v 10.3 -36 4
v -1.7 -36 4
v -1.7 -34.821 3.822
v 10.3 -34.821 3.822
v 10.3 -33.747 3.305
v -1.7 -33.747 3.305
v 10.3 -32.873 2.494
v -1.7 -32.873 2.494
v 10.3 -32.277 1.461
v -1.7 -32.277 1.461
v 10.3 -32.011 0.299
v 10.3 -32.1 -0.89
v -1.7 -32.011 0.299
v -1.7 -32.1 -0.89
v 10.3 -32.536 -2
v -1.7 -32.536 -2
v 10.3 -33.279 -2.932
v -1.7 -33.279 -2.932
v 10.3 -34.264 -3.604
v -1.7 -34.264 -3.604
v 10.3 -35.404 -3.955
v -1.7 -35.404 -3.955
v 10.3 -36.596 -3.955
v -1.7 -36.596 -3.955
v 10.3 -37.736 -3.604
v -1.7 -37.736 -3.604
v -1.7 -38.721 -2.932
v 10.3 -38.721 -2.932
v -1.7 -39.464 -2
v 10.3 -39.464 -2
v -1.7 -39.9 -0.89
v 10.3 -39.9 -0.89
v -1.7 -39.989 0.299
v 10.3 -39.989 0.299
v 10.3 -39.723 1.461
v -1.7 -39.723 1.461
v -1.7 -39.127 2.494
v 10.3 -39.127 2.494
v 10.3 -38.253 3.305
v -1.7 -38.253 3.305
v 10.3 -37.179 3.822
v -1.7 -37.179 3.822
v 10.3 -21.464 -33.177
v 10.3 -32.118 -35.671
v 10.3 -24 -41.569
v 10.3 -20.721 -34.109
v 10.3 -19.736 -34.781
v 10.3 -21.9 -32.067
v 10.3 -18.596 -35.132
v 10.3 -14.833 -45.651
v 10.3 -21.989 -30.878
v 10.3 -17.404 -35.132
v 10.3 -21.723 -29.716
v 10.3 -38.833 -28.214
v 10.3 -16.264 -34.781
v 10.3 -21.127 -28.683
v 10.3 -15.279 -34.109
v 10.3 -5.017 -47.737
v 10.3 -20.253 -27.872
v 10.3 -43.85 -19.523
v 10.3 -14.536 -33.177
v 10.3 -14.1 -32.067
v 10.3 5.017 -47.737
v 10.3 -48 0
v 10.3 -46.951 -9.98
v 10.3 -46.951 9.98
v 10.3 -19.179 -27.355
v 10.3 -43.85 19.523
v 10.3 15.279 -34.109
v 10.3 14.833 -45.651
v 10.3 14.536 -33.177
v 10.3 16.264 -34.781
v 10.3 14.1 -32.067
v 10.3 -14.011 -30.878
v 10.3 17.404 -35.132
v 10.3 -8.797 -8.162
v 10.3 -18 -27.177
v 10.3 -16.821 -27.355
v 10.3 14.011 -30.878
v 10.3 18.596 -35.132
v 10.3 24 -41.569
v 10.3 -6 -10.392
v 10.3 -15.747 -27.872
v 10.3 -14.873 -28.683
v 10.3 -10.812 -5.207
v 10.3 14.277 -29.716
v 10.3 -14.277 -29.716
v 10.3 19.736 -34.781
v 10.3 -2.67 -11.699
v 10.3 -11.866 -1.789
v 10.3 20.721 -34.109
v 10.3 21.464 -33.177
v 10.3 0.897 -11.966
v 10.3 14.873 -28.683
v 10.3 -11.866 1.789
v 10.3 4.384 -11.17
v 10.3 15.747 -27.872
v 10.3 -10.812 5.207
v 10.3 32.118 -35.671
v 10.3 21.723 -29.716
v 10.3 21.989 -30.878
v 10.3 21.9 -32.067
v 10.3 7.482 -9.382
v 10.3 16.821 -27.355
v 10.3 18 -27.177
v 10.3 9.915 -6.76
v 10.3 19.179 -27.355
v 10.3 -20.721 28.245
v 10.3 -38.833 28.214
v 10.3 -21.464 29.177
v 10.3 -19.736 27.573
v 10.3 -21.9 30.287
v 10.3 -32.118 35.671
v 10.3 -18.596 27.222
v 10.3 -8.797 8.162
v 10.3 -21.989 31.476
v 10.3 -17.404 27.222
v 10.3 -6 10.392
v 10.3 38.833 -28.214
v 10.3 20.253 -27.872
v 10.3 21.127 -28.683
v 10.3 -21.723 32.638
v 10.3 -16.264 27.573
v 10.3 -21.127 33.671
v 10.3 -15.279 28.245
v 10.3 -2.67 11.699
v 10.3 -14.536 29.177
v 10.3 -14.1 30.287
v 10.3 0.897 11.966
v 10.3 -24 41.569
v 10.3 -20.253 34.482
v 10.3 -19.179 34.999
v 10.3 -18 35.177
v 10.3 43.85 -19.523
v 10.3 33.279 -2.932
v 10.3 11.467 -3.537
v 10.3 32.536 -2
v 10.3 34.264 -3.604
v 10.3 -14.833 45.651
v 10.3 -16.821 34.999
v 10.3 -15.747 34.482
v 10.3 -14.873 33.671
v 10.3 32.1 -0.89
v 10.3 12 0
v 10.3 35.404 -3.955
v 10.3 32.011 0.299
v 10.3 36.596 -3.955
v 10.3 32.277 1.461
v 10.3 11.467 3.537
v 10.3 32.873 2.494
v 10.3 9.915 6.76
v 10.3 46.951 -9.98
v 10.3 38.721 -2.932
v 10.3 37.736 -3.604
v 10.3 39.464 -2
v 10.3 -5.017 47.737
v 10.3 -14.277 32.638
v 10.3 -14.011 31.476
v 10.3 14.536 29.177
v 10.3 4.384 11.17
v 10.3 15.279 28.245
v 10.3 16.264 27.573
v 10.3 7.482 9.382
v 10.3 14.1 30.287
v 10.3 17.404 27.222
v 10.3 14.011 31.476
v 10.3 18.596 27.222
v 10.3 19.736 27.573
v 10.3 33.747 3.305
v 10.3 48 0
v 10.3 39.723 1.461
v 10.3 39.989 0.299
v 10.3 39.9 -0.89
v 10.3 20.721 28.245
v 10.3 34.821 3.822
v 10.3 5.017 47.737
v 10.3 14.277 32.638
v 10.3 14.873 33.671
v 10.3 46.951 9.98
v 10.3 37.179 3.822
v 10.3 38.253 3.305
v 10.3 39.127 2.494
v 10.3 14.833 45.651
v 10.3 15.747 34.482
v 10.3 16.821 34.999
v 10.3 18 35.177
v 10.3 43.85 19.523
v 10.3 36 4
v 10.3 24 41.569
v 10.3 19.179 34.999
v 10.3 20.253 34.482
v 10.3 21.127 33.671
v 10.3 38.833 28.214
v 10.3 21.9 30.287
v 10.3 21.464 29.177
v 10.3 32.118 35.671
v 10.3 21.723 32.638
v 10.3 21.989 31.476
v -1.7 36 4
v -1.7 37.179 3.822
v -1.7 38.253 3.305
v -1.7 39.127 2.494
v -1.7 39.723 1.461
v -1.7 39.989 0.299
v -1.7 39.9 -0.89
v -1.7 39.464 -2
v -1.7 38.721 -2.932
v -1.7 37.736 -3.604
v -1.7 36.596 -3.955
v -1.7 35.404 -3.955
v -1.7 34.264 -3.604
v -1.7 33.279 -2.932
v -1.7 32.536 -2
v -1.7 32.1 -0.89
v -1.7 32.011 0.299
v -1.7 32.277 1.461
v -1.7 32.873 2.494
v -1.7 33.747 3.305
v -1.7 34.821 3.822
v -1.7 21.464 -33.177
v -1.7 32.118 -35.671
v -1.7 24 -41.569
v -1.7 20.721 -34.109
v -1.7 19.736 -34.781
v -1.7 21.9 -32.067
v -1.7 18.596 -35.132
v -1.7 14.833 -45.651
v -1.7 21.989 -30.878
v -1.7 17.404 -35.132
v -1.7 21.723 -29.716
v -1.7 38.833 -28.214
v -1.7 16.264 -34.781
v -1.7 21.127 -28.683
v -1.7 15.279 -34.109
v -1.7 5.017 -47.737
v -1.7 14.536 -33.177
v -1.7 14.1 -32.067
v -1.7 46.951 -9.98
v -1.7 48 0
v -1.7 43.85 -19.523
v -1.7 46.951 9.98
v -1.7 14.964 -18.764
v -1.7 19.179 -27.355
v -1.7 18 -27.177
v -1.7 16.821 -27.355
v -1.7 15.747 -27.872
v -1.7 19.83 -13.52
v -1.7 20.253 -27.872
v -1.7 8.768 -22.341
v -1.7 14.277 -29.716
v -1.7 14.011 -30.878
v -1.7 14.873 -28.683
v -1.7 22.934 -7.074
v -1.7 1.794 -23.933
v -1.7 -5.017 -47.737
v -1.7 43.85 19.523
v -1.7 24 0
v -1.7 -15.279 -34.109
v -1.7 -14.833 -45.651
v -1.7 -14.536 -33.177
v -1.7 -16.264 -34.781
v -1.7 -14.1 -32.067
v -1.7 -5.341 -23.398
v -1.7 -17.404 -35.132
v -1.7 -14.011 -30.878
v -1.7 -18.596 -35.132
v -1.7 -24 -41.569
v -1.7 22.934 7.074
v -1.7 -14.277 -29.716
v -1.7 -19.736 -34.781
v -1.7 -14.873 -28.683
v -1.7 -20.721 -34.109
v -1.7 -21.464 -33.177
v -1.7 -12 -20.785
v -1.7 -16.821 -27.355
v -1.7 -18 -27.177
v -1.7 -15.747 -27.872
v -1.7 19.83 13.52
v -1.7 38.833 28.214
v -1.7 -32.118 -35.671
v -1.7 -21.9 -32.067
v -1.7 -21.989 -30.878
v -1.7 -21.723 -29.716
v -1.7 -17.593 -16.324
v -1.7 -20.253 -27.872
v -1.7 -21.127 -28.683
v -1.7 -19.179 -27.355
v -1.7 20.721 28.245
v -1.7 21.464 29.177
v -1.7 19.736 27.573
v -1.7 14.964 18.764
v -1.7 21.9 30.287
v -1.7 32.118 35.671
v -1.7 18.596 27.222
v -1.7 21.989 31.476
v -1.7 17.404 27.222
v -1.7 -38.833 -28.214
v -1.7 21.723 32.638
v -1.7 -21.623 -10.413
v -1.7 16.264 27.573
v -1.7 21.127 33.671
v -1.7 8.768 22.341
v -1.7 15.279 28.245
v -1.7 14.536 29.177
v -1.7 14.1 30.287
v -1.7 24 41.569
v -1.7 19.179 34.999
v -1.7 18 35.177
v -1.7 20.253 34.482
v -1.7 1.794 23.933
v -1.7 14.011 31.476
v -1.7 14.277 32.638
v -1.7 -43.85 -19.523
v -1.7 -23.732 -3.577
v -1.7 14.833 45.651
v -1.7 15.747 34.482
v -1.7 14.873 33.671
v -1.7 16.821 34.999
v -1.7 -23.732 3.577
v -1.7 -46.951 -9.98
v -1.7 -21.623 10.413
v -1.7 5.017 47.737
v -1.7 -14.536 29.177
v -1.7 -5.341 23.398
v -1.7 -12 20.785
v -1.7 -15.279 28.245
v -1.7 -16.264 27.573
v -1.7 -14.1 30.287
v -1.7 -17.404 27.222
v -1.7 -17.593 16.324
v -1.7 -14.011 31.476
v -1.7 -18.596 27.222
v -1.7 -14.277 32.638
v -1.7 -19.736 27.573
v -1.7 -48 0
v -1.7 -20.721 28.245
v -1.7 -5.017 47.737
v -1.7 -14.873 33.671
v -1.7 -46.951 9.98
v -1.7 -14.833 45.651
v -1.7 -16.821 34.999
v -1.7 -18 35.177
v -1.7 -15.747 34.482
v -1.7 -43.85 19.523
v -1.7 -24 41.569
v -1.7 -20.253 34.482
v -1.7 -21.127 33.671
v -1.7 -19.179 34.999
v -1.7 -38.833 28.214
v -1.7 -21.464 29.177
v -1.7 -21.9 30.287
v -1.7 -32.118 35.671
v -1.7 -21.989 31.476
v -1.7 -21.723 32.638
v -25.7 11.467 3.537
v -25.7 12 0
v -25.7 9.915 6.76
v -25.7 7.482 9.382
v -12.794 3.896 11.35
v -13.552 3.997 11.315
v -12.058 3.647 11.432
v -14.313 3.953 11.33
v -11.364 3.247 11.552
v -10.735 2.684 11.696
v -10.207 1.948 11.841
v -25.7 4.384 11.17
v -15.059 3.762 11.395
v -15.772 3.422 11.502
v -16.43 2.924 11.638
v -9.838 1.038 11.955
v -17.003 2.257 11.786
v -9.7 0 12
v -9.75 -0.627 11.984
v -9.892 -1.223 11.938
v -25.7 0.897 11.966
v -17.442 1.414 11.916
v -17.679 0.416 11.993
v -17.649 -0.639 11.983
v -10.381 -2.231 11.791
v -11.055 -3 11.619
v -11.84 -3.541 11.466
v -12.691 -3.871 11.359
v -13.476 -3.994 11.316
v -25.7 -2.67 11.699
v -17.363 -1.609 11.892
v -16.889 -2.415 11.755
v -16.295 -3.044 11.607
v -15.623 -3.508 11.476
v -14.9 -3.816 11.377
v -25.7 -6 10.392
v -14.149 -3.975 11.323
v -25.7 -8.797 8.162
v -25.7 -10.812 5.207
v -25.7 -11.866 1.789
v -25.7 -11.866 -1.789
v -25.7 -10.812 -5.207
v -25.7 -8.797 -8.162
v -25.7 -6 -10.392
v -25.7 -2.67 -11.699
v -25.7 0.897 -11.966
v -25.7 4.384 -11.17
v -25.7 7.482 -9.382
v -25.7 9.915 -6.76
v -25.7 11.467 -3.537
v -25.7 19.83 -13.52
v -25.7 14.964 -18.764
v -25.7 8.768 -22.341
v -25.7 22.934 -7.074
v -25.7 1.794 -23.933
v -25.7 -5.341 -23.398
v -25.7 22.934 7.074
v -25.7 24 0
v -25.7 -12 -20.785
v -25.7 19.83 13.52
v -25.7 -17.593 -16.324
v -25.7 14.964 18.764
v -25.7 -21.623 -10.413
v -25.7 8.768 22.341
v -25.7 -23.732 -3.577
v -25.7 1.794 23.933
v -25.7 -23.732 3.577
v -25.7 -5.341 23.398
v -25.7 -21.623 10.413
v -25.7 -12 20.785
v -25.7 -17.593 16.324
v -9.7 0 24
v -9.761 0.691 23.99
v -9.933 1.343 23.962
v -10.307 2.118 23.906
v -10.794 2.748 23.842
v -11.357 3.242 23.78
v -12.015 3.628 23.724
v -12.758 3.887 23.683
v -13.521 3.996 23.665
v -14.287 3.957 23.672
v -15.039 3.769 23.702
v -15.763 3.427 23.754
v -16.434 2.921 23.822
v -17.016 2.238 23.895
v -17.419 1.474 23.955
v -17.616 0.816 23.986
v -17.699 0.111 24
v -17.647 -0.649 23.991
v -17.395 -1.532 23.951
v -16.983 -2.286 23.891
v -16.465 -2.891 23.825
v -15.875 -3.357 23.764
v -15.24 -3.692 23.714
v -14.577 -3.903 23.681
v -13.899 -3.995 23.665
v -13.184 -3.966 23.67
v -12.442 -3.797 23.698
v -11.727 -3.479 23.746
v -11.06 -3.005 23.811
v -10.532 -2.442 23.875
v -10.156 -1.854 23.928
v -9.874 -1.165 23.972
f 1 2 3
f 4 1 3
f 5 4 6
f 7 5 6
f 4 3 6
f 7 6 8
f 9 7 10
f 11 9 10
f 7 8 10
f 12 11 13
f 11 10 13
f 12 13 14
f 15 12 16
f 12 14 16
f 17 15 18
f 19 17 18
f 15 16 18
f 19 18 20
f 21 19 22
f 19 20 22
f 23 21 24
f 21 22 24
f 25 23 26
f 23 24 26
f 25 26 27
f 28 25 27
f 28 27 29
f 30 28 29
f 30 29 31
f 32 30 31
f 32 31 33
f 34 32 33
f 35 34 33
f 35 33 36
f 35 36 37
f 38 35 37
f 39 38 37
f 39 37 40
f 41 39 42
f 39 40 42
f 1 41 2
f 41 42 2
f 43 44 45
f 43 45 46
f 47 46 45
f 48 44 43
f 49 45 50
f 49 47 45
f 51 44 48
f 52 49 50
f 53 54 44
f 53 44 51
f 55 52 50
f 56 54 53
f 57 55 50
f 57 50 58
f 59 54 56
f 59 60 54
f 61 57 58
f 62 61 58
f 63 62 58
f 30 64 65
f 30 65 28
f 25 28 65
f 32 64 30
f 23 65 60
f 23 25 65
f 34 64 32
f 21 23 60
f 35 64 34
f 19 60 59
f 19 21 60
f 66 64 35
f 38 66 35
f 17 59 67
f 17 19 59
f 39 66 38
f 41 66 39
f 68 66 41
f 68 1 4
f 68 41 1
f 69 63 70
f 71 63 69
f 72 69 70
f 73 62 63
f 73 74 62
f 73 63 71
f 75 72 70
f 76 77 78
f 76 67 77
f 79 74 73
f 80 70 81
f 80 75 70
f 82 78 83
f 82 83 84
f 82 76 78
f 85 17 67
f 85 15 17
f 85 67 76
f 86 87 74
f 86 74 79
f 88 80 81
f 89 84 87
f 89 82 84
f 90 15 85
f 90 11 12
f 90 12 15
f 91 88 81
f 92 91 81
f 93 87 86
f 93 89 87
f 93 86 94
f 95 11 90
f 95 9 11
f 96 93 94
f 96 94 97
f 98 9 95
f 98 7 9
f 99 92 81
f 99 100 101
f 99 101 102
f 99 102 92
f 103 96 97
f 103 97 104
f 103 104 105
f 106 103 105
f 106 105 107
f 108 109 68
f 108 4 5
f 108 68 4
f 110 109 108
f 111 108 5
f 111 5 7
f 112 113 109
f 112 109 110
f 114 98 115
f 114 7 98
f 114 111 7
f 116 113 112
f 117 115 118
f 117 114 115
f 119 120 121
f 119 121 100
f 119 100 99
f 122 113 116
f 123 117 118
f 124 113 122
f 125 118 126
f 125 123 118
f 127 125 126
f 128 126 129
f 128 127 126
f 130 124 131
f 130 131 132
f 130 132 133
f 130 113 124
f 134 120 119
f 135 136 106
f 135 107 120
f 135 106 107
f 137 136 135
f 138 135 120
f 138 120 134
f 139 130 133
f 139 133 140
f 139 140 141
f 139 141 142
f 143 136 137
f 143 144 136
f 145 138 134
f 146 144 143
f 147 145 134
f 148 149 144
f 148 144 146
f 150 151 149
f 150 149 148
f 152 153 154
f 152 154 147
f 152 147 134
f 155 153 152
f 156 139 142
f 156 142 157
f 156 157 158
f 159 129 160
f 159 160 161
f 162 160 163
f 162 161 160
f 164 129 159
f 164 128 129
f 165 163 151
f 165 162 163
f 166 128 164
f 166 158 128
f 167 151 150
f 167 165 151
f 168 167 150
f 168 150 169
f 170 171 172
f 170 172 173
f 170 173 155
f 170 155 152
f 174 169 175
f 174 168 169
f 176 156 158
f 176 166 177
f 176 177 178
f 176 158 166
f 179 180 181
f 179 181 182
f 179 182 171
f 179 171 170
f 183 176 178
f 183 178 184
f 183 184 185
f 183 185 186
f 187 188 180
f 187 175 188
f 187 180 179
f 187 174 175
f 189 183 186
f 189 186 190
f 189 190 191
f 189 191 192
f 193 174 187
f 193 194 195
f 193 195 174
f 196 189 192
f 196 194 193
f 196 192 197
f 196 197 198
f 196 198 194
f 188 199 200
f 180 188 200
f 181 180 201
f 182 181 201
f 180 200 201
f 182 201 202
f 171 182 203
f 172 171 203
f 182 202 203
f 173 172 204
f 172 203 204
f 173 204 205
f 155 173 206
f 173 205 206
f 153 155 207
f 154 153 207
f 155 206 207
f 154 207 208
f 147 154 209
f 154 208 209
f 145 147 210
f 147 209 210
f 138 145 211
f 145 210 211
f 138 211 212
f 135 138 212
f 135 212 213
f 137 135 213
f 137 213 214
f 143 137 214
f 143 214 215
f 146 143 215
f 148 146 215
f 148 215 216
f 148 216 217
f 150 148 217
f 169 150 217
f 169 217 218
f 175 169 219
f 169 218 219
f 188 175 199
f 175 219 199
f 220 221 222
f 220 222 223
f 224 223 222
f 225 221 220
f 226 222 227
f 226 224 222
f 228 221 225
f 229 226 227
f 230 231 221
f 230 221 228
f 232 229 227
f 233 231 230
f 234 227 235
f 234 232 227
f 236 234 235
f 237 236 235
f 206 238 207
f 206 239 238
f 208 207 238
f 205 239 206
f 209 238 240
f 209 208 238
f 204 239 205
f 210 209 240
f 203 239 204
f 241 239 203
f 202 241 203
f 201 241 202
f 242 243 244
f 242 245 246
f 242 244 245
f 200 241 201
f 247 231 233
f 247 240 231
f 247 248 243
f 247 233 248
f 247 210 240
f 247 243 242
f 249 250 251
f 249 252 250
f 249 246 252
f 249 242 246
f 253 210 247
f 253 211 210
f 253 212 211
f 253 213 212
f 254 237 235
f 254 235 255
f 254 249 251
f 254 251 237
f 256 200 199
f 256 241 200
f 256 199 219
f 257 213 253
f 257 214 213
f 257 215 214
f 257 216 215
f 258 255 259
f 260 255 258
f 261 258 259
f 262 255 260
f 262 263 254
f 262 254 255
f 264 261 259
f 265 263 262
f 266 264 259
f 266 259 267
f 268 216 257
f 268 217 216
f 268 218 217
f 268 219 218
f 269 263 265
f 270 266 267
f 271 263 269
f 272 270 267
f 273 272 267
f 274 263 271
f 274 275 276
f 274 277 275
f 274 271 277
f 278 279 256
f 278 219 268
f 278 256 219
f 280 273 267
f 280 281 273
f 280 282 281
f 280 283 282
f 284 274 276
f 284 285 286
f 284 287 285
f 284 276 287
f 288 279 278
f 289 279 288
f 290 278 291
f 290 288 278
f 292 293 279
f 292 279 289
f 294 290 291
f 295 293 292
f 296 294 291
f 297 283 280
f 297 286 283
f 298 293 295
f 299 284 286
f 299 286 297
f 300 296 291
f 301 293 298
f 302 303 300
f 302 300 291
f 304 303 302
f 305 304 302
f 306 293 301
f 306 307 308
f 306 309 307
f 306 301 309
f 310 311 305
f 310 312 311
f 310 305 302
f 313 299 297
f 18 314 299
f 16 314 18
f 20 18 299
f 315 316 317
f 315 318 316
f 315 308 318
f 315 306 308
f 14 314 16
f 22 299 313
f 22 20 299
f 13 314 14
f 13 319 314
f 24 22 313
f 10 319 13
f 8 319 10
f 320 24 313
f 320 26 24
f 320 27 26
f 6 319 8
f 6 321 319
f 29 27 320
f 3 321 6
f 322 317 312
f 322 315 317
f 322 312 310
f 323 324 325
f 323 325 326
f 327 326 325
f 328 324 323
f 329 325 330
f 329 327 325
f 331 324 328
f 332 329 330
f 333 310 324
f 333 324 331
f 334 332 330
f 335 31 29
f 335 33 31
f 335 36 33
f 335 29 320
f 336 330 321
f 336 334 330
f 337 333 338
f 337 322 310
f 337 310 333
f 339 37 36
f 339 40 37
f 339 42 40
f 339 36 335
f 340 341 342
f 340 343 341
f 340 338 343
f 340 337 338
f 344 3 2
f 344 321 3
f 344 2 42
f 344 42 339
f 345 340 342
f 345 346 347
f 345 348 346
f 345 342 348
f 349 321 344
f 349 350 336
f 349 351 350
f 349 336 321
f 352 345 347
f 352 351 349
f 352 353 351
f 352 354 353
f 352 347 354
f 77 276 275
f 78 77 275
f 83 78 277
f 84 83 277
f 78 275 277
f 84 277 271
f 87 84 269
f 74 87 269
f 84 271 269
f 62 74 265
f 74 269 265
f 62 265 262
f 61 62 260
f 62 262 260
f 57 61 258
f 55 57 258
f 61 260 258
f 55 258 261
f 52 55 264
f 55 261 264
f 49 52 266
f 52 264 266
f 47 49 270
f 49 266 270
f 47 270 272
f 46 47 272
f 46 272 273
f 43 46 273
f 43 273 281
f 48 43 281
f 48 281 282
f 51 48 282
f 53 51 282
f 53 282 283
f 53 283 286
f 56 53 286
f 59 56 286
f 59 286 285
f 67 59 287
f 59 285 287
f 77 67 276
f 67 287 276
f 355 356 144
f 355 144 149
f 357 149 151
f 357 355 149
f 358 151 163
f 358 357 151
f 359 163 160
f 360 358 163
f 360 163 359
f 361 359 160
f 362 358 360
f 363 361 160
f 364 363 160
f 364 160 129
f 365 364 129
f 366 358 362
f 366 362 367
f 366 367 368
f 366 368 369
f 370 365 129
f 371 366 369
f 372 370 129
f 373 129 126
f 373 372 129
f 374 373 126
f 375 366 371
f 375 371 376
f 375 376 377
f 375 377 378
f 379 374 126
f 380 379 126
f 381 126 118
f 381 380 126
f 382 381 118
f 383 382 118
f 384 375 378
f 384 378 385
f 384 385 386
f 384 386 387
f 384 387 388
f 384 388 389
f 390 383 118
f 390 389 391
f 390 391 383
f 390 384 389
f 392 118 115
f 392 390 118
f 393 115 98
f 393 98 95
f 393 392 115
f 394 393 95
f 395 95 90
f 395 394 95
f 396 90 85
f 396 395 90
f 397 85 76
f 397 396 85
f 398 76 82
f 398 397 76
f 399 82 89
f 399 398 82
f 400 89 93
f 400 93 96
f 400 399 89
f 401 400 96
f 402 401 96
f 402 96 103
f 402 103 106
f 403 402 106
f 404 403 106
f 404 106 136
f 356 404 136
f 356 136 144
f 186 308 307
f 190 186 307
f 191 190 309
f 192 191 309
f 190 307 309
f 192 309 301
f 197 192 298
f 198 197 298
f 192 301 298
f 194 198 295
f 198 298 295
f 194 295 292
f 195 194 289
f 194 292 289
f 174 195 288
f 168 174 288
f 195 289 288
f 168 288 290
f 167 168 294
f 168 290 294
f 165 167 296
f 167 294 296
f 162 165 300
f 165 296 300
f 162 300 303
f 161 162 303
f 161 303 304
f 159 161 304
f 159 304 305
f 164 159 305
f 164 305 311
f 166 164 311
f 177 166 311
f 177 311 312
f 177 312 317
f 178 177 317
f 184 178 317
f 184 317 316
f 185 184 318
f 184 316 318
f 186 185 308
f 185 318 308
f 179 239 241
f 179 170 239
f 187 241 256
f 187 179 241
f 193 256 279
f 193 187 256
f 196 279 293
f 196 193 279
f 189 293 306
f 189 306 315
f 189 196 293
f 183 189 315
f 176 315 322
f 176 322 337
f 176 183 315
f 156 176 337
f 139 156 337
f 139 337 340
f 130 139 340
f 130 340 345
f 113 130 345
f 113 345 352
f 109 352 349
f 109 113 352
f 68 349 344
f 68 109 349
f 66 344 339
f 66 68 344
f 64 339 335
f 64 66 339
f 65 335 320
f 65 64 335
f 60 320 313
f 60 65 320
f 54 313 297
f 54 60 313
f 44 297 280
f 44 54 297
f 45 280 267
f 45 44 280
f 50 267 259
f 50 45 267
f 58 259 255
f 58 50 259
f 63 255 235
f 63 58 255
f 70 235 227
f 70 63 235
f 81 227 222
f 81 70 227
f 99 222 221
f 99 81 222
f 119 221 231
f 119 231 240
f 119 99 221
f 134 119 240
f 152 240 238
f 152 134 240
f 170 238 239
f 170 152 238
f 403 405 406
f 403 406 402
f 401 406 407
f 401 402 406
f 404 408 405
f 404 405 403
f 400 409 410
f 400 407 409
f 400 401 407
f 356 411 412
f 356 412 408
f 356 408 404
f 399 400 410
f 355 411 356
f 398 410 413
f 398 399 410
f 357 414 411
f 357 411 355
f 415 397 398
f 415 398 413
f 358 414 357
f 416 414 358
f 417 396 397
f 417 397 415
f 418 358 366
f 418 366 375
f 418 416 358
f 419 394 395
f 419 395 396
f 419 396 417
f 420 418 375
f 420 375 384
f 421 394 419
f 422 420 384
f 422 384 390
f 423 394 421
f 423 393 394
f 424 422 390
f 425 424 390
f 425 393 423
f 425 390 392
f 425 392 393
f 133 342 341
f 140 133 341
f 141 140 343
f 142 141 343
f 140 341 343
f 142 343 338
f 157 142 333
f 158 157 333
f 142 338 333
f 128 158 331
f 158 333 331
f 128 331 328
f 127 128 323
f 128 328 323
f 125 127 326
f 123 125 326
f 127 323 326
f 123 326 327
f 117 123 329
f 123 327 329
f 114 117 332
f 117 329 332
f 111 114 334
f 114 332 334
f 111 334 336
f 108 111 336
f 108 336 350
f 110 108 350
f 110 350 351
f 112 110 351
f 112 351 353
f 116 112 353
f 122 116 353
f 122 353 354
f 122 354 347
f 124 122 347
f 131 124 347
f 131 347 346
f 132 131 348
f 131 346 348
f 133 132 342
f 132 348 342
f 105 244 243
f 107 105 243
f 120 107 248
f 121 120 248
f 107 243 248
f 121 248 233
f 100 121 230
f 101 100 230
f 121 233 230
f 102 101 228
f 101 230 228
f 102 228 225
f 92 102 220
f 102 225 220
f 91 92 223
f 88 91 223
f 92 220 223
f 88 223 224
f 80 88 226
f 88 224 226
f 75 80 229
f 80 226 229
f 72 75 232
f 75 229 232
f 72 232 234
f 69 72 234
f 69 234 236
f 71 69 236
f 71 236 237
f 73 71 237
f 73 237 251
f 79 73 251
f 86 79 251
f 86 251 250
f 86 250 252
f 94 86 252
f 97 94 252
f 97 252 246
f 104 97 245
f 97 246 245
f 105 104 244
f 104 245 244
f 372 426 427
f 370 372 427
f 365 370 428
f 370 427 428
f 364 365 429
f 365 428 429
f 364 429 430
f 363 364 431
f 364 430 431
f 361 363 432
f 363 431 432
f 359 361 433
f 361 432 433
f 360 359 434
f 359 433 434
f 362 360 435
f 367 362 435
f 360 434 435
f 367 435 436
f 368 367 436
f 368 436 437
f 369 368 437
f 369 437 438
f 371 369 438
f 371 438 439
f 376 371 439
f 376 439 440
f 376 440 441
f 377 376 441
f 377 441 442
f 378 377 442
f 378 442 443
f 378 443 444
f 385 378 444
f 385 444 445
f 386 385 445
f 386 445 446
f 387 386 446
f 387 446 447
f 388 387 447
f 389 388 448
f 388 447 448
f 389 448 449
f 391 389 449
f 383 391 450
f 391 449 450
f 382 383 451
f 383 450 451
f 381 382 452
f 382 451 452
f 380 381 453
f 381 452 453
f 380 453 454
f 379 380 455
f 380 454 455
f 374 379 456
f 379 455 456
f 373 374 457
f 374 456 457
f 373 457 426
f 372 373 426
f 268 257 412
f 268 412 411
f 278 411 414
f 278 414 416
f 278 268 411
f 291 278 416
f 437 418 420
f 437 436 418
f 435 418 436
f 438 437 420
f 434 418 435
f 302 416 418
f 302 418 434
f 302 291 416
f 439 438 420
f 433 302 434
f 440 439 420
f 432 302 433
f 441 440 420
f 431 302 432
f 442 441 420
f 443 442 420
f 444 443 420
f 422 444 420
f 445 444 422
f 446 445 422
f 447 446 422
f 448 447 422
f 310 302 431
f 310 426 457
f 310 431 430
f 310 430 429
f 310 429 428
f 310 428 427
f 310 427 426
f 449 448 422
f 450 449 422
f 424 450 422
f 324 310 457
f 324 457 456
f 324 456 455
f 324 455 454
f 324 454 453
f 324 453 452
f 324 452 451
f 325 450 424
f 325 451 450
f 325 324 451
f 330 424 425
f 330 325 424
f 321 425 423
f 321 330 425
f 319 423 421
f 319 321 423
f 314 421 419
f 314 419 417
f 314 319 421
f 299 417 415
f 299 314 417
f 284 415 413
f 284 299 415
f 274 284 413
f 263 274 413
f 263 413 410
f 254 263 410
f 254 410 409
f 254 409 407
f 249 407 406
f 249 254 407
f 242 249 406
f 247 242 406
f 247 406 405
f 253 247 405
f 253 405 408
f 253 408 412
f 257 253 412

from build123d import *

# Parameters (mm, degrees)
SKETCH2_R          = 4
CUT_EXTRUDE1_DEPTH = 12
CUT_EXTRUDE2_REACH = 74
SKETCH3_R          = 4


with BuildPart() as part:
    # Sketch1 → Revolve1 (revolve)
    with BuildSketch(Plane.XY):
        Polygon((-25.700460829, 12), (-25.700460829, 24), (-1.700460829, 24), (-1.700460829, 48), (10.299539171, 48), (10.299539171, 12), align=None)
    revolve(axis=Axis((-11.612903226, 0, 0), (1, 0, 0)))

    # Sketch2 → Cut-Extrude1 (cut)
    with BuildSketch(Plane.ZY.offset(1.700460829)):
        with Locations((0, 36)):
            Circle(SKETCH2_R)
        with Locations((31.176914536, 18)):
            Circle(SKETCH2_R)
        with Locations((31.176914536, -18)):
            Circle(SKETCH2_R)
        with Locations((0, -36)):
            Circle(SKETCH2_R)
        with Locations((-31.176914536, -18)):
            Circle(SKETCH2_R)
        with Locations((-31.176914536, 18)):
            Circle(SKETCH2_R)
    extrude(amount=-CUT_EXTRUDE1_DEPTH, mode=Mode.SUBTRACT)

    # Sketch3 → Cut-Extrude2 (cut, up to next)
    with BuildSketch(Plane.XY.offset(24), mode=Mode.PRIVATE) as cut_extrude2_sk1:
        with Locations((-13.700460829, 0)):
            Circle(SKETCH3_R)
    cut_extrude2_tool1 = extrude(cut_extrude2_sk1.sketch, amount=-CUT_EXTRUDE2_REACH, mode=Mode.PRIVATE) & part.part
    add(cut_extrude2_tool1.solids().sort_by_distance((-13.700461, 0, 24))[0], mode=Mode.SUBTRACT)


solid = part.part
